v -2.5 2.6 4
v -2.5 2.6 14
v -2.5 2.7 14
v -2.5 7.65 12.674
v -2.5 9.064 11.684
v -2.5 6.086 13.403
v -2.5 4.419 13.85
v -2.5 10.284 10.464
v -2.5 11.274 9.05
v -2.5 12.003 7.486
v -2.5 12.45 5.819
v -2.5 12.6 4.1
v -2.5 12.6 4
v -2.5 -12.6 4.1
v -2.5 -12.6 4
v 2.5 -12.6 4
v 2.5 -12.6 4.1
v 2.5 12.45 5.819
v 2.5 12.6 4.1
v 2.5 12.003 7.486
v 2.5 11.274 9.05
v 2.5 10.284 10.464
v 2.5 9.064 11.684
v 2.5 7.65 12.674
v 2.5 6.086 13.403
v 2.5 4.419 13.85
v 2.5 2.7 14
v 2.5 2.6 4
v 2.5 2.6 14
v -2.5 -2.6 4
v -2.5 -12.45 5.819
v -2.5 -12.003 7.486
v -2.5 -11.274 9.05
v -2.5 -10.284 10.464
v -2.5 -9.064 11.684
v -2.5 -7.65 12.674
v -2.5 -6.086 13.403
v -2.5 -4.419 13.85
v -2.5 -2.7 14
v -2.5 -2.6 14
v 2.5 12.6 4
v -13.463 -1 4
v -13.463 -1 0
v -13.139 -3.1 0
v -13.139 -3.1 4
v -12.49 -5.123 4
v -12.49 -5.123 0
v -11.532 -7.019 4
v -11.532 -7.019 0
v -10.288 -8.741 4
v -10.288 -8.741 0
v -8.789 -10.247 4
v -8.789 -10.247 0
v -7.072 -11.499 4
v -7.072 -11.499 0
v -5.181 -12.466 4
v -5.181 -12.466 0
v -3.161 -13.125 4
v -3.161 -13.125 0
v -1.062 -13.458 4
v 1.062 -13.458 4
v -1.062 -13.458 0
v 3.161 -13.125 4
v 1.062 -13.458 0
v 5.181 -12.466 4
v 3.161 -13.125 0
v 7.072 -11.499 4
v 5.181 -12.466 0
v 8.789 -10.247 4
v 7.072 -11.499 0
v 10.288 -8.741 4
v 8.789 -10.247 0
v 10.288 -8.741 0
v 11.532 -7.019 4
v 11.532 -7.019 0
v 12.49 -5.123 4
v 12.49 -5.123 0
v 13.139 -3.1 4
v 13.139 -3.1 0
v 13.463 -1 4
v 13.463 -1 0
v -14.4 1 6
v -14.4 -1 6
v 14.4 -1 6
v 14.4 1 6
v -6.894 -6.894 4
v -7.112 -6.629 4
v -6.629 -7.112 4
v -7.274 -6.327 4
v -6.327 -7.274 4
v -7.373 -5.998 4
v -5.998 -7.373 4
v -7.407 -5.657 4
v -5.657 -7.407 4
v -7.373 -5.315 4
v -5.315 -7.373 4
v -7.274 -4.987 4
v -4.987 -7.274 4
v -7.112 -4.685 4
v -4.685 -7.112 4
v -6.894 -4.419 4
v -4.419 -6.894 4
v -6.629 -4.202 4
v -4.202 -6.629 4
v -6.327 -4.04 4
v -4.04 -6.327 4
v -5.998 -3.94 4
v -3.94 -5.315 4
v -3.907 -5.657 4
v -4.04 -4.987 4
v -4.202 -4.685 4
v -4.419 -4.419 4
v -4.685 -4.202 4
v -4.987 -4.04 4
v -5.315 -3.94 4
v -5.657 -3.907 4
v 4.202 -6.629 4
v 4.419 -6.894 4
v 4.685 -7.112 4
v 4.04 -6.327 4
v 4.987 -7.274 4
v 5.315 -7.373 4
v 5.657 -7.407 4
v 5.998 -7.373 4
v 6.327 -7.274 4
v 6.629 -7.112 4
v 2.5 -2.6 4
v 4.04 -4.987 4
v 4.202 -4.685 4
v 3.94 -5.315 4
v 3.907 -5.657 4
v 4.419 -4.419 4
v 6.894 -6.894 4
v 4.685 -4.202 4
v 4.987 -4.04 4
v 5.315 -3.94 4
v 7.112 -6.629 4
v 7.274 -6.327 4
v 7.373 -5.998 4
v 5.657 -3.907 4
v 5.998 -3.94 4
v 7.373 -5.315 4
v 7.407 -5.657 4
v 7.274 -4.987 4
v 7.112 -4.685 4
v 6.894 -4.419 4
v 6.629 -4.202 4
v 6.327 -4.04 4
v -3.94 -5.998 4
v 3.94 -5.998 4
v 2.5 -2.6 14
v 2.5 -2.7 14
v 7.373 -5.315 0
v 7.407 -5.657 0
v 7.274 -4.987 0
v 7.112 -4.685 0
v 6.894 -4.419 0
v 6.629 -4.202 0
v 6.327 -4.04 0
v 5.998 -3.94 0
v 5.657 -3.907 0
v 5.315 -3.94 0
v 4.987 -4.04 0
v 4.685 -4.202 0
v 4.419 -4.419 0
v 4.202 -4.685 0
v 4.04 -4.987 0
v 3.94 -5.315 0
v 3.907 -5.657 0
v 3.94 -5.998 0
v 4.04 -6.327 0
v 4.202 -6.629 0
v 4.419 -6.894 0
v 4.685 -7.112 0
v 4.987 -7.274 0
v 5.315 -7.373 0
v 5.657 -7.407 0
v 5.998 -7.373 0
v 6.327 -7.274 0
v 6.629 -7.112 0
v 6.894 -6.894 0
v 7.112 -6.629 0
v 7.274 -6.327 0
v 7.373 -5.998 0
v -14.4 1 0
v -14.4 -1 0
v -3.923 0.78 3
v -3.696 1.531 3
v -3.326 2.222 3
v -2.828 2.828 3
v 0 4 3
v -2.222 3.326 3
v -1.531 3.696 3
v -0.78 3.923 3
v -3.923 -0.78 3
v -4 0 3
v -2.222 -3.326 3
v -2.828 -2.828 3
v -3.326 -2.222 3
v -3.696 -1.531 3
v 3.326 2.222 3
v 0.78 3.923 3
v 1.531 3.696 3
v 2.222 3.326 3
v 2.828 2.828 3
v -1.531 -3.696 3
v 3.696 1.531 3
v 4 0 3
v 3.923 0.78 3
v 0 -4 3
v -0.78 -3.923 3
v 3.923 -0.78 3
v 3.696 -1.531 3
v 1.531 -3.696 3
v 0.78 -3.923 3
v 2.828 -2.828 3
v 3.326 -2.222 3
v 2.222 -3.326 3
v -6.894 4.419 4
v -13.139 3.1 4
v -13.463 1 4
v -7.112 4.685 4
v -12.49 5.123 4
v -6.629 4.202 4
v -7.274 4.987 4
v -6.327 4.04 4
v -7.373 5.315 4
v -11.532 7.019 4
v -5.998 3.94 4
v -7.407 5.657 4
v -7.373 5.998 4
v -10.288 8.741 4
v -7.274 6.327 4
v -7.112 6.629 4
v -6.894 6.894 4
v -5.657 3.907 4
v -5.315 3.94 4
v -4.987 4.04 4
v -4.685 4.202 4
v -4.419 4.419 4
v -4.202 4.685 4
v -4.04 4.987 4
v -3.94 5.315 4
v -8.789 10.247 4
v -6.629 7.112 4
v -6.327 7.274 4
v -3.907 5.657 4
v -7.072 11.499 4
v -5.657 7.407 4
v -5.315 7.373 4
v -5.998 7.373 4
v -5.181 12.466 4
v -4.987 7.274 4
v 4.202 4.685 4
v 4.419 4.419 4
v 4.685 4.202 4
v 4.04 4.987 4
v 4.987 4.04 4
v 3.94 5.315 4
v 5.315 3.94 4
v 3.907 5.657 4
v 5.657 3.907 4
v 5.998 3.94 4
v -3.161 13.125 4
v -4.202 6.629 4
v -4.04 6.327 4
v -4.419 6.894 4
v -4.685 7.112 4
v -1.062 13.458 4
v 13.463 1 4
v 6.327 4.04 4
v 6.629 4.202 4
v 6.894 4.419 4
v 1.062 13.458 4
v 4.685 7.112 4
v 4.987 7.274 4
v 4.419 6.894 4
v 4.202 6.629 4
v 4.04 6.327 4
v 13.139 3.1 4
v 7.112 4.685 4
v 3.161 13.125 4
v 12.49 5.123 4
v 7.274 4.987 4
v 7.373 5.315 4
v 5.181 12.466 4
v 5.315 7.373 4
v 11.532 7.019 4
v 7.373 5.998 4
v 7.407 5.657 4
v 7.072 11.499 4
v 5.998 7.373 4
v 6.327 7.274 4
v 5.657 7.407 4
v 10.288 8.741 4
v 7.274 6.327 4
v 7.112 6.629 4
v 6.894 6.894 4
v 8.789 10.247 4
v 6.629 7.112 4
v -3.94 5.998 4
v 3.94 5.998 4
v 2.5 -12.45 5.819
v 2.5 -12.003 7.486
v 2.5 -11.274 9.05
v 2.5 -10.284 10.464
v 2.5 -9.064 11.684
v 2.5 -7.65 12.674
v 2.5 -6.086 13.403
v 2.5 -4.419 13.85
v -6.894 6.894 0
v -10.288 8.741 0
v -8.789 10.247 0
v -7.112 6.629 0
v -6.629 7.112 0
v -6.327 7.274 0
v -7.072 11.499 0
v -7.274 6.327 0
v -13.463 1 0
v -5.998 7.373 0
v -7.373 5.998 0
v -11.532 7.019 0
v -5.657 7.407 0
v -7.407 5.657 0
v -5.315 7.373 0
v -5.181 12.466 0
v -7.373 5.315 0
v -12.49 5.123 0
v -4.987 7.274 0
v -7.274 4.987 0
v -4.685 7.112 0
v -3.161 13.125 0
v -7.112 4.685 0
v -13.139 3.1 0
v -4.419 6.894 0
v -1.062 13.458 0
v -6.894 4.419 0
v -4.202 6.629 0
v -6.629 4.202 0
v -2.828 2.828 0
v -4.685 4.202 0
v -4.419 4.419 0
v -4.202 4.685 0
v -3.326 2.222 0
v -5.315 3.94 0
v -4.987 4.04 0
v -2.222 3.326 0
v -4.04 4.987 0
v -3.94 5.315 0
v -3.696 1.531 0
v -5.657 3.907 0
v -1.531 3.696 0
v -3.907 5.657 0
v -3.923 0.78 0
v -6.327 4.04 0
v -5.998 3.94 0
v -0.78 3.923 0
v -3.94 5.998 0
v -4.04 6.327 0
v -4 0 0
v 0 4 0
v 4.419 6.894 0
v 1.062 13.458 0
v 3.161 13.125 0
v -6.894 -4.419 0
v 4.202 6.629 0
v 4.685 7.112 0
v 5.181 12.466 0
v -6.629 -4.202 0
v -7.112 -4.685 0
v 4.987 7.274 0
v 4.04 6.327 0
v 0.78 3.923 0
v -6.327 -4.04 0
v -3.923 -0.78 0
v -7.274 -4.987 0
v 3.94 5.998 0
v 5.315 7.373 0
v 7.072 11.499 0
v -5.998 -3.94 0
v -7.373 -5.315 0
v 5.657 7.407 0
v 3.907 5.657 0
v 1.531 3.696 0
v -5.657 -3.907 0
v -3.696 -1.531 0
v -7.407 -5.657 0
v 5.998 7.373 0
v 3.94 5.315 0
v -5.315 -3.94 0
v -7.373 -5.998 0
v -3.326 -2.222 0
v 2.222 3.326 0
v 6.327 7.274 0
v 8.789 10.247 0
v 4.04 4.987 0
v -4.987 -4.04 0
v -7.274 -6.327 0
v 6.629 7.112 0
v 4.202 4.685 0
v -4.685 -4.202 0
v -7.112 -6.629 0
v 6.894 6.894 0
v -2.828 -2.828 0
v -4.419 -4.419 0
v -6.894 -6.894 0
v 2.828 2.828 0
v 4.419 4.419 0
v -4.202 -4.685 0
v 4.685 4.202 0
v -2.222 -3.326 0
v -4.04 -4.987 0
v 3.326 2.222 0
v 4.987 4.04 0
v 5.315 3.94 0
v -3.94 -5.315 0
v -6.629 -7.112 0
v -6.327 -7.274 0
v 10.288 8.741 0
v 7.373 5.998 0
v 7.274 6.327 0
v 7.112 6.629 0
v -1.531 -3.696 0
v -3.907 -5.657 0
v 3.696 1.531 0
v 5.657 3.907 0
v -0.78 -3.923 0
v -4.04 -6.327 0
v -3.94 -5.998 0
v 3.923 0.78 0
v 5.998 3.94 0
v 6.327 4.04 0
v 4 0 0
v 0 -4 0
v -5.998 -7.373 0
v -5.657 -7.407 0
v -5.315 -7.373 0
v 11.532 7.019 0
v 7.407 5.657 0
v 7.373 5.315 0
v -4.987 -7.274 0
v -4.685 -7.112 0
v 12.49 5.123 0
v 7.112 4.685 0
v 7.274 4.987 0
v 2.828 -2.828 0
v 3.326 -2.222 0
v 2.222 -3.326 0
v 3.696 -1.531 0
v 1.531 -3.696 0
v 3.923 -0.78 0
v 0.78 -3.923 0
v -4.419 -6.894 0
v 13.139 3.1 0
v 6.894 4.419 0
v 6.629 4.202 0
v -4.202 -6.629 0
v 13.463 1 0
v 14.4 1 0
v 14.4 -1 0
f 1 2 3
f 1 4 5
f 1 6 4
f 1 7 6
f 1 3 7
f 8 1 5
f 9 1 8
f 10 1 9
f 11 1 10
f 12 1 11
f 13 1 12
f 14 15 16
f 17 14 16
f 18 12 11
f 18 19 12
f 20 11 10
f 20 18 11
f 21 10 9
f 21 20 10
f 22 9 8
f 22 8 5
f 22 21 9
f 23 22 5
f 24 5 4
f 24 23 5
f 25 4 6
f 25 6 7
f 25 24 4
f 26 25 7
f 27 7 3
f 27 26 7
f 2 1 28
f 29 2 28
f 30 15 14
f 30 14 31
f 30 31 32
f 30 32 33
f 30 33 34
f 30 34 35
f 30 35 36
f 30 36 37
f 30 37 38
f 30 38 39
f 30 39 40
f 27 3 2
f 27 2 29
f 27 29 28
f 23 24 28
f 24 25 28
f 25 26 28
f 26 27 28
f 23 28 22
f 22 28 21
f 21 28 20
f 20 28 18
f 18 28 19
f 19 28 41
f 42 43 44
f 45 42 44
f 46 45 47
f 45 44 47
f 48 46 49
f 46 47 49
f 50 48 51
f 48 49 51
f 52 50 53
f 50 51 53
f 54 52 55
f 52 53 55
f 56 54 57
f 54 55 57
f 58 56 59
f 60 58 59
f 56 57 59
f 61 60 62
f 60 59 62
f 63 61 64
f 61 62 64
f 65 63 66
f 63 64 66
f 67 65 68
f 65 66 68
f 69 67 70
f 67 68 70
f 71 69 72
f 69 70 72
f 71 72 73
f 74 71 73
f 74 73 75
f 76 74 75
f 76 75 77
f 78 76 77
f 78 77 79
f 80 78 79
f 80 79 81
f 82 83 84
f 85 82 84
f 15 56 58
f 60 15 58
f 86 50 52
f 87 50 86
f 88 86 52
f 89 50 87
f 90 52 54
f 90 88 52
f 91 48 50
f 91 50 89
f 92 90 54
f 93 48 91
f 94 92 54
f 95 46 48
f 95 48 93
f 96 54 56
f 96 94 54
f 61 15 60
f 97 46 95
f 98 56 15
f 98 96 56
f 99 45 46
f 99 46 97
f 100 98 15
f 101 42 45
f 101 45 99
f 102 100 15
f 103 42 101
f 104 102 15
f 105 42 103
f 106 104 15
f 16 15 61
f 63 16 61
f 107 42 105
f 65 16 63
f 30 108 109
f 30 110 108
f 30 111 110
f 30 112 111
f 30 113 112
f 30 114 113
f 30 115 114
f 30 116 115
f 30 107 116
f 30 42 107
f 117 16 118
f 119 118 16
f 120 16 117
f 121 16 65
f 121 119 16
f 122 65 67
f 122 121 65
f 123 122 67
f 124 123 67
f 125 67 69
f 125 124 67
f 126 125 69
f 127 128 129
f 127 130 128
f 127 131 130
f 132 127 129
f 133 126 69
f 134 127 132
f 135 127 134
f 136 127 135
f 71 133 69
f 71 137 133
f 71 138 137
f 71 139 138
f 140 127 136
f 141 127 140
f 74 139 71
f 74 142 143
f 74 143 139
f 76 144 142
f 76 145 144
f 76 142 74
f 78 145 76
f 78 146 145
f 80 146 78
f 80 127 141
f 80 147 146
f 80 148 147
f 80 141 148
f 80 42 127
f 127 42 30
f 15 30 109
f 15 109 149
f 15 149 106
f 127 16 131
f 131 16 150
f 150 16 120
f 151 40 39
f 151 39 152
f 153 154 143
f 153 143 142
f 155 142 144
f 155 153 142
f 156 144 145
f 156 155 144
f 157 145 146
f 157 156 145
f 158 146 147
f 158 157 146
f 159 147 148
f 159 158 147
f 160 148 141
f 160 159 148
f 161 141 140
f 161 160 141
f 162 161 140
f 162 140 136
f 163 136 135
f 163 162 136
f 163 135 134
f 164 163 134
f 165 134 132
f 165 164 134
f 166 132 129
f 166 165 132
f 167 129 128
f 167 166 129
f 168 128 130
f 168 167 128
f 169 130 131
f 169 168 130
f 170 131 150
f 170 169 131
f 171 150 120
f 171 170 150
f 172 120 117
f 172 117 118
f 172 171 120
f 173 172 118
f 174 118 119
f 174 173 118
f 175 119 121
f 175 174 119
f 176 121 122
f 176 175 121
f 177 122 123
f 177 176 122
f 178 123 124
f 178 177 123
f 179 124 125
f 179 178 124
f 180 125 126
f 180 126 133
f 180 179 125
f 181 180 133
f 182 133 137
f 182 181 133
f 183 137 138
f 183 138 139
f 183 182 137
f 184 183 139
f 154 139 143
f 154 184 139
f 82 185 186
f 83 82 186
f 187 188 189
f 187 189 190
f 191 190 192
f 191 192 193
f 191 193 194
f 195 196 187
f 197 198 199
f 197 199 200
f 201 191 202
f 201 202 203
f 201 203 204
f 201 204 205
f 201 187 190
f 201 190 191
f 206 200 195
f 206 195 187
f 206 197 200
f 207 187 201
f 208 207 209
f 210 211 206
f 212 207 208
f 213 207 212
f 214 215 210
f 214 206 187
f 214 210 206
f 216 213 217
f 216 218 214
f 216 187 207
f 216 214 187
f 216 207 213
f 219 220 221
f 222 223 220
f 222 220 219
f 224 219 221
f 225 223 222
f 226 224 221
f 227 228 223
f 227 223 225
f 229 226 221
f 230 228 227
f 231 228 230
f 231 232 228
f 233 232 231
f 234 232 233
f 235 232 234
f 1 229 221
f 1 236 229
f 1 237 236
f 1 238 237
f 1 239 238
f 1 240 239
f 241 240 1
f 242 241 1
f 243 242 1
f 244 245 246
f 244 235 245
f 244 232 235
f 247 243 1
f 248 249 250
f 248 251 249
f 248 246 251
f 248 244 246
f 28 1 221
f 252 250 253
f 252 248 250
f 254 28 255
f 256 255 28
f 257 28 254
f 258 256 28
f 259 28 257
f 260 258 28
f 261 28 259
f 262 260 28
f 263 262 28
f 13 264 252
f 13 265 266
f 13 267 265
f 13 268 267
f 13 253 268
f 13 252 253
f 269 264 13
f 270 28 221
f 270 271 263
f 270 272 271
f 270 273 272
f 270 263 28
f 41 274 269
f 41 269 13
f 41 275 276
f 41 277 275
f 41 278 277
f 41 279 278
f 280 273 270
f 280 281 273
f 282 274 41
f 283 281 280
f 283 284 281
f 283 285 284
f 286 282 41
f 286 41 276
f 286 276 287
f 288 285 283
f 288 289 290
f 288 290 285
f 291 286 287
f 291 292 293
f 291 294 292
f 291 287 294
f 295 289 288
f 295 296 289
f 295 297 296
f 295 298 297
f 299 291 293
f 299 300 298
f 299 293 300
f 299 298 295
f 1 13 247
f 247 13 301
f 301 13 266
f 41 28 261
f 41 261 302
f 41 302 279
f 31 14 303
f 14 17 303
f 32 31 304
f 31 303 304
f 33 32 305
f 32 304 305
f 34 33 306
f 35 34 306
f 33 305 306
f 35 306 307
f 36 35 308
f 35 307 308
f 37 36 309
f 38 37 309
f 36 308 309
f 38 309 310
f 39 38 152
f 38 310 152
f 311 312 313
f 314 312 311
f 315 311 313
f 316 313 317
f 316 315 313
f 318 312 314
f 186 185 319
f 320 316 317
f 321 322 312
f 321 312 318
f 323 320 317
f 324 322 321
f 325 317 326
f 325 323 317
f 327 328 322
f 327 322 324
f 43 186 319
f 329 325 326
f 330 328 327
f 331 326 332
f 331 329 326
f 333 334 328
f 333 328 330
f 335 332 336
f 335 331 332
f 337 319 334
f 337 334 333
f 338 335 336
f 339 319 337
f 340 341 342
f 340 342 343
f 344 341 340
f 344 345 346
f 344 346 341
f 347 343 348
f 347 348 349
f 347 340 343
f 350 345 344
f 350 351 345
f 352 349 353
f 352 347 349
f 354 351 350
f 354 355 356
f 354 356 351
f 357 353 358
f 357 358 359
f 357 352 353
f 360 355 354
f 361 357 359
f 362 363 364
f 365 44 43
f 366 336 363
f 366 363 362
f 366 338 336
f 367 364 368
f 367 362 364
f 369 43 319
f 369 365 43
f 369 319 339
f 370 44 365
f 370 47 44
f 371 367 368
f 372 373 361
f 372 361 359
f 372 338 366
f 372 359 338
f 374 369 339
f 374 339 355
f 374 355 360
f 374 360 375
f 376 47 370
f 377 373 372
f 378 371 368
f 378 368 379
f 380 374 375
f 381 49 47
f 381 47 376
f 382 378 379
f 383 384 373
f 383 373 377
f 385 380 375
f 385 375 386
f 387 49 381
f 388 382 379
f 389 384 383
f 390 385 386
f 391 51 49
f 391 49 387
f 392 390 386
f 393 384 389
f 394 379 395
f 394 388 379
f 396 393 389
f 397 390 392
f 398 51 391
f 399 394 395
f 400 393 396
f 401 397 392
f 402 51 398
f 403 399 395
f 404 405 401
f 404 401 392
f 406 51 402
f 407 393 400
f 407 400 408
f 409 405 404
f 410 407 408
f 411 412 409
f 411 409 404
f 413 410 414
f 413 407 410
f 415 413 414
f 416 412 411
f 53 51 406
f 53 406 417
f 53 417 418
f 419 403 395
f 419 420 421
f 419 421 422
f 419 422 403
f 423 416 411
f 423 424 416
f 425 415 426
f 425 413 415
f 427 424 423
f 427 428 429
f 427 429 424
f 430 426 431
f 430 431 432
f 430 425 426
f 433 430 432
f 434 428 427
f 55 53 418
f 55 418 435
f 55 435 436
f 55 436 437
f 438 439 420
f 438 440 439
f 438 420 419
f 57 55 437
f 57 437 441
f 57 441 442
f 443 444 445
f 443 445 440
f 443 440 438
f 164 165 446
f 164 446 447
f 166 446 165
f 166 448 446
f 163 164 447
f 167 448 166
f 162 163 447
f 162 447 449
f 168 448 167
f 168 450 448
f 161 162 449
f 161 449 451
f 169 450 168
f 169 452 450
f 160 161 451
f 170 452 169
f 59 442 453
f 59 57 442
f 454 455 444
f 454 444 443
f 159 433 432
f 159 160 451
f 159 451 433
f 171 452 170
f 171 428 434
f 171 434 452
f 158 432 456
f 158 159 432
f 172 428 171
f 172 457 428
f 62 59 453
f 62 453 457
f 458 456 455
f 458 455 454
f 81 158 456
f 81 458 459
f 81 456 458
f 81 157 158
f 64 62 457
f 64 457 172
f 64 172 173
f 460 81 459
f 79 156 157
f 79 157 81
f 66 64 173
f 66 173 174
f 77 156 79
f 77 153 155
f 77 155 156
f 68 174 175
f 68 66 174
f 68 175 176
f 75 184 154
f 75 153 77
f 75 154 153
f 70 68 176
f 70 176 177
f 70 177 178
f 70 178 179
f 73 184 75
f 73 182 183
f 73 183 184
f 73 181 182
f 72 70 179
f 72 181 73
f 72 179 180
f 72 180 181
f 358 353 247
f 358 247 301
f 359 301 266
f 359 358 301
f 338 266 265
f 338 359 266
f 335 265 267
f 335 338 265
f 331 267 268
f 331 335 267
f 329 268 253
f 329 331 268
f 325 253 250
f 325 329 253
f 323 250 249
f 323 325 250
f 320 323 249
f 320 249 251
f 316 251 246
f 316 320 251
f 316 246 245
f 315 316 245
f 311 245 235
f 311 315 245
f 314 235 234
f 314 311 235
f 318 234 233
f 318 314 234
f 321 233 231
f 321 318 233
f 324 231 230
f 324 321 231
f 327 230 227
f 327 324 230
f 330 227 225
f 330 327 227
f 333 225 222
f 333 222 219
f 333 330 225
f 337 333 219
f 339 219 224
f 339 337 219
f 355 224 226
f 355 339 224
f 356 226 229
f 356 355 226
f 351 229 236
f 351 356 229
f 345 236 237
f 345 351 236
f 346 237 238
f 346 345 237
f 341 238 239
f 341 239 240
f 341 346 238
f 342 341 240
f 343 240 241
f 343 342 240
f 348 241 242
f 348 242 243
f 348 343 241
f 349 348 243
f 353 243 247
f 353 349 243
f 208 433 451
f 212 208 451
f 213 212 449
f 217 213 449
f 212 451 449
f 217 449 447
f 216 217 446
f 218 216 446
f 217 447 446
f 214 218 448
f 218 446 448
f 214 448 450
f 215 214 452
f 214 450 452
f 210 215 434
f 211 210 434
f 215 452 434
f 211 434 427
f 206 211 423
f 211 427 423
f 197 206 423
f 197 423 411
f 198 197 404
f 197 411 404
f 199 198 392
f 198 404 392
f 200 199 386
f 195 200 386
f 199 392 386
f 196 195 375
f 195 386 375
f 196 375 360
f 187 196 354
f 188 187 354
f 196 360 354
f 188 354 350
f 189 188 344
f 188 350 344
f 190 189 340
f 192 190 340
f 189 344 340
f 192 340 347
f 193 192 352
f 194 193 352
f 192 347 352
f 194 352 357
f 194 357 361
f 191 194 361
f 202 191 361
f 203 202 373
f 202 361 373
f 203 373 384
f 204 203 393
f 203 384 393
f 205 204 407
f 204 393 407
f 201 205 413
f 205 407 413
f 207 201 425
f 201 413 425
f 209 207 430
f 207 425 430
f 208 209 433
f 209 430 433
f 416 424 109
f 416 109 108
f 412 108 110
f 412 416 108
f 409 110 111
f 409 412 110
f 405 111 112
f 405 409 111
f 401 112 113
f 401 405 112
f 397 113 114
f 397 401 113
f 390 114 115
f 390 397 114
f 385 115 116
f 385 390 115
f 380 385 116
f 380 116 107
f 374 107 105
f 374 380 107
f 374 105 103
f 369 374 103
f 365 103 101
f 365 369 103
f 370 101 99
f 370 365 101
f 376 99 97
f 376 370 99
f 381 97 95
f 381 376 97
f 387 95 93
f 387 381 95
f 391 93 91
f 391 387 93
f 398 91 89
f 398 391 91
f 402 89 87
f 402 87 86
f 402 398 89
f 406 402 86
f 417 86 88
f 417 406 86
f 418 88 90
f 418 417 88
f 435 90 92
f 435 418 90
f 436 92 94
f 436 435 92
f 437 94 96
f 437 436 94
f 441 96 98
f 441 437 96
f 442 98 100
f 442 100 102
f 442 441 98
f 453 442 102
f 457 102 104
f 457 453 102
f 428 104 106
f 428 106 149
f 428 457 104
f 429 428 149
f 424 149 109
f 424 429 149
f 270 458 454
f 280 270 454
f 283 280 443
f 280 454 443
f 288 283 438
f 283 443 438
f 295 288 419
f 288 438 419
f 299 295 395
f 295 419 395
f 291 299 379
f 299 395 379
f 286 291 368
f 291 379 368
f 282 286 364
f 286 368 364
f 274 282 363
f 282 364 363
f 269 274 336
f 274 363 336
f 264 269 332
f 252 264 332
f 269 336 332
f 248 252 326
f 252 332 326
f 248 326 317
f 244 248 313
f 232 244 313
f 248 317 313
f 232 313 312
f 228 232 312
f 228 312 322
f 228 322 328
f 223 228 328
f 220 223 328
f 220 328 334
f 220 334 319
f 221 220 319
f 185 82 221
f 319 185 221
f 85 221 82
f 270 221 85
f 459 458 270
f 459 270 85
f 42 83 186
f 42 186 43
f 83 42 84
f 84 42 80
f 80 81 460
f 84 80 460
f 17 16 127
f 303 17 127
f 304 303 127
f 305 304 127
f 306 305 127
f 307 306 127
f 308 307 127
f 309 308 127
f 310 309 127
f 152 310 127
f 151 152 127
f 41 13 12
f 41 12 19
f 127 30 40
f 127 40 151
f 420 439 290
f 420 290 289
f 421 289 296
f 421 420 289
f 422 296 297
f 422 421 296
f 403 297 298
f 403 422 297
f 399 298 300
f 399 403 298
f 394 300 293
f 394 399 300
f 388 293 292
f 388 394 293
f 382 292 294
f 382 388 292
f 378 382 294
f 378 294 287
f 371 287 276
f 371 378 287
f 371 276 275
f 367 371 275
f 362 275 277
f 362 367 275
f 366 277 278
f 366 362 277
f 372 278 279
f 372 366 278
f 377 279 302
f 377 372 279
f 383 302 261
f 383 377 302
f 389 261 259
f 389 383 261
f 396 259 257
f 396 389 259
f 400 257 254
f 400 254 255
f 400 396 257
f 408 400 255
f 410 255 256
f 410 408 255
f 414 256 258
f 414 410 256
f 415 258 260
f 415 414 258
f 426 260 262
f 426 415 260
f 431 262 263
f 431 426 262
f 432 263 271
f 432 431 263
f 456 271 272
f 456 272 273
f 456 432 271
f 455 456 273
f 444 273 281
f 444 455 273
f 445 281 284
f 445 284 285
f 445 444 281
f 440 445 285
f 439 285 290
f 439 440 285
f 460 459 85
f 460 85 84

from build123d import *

# Parameters (mm, degrees)
SKETCH_R     = 13.5
SKETCH_R_2   = 1.75
PAD_DEPTH    = 4
SKETCH004_W  = 28.8
SKETCH004_H  = 2
PAD001_DEPTH = 6
SKETCH005_R  = 4
POCKET_DEPTH = 3
SKETCH006_W  = 5
SKETCH006_H  = 10
PAD002_DEPTH = 10
FILLET_R     = 9.9


with BuildPart() as part:
    # Sketch → Pad (new body)
    with BuildSketch(Plane.XY):
        Circle(SKETCH_R)
        with Locations((-5.656854, -5.656854)):
            Circle(SKETCH_R_2, mode=Mode.SUBTRACT)
        with Locations((5.656854, 5.656854)):
            Circle(SKETCH_R_2, mode=Mode.SUBTRACT)
        with Locations((-5.656854, 5.656854)):
            Circle(SKETCH_R_2, mode=Mode.SUBTRACT)
        with Locations((5.656854, -5.656854)):
            Circle(SKETCH_R_2, mode=Mode.SUBTRACT)
    extrude(amount=PAD_DEPTH)

    # Sketch004 → Pad001 (join)
    with BuildSketch(Plane(origin=(0, 0, 0), x_dir=(1, 0, 0), z_dir=(0, 0, -1))):
        Rectangle(SKETCH004_W, SKETCH004_H)
    extrude(amount=-PAD001_DEPTH)

    # Sketch005 (on Face1 of Pad001) → Pocket (cut)
    with BuildSketch(Plane(origin=(0, 0, 0), x_dir=(1, 0, 0), z_dir=(0, 0, -1))):
        Circle(SKETCH005_R)
    extrude(amount=-POCKET_DEPTH, mode=Mode.SUBTRACT)

    # Sketch006 (on Face18 of Pocket) → Pad002 (join)
    with BuildSketch(Plane.XY.offset(4)):
        with Locations((0, -7.6)):
            Rectangle(SKETCH006_W, SKETCH006_H)
        with Locations((0, 7.6)):
            Rectangle(SKETCH006_W, SKETCH006_H)
    extrude(amount=PAD002_DEPTH)

    # Fillet
    fillet_edges = [part.edges().sort_by_distance(p)[0] for p in [
        (0, 12.6, 14),
        (0, -12.6, 14),
    ]]
    fillet(fillet_edges, radius=FILLET_R)


solid = part.part
